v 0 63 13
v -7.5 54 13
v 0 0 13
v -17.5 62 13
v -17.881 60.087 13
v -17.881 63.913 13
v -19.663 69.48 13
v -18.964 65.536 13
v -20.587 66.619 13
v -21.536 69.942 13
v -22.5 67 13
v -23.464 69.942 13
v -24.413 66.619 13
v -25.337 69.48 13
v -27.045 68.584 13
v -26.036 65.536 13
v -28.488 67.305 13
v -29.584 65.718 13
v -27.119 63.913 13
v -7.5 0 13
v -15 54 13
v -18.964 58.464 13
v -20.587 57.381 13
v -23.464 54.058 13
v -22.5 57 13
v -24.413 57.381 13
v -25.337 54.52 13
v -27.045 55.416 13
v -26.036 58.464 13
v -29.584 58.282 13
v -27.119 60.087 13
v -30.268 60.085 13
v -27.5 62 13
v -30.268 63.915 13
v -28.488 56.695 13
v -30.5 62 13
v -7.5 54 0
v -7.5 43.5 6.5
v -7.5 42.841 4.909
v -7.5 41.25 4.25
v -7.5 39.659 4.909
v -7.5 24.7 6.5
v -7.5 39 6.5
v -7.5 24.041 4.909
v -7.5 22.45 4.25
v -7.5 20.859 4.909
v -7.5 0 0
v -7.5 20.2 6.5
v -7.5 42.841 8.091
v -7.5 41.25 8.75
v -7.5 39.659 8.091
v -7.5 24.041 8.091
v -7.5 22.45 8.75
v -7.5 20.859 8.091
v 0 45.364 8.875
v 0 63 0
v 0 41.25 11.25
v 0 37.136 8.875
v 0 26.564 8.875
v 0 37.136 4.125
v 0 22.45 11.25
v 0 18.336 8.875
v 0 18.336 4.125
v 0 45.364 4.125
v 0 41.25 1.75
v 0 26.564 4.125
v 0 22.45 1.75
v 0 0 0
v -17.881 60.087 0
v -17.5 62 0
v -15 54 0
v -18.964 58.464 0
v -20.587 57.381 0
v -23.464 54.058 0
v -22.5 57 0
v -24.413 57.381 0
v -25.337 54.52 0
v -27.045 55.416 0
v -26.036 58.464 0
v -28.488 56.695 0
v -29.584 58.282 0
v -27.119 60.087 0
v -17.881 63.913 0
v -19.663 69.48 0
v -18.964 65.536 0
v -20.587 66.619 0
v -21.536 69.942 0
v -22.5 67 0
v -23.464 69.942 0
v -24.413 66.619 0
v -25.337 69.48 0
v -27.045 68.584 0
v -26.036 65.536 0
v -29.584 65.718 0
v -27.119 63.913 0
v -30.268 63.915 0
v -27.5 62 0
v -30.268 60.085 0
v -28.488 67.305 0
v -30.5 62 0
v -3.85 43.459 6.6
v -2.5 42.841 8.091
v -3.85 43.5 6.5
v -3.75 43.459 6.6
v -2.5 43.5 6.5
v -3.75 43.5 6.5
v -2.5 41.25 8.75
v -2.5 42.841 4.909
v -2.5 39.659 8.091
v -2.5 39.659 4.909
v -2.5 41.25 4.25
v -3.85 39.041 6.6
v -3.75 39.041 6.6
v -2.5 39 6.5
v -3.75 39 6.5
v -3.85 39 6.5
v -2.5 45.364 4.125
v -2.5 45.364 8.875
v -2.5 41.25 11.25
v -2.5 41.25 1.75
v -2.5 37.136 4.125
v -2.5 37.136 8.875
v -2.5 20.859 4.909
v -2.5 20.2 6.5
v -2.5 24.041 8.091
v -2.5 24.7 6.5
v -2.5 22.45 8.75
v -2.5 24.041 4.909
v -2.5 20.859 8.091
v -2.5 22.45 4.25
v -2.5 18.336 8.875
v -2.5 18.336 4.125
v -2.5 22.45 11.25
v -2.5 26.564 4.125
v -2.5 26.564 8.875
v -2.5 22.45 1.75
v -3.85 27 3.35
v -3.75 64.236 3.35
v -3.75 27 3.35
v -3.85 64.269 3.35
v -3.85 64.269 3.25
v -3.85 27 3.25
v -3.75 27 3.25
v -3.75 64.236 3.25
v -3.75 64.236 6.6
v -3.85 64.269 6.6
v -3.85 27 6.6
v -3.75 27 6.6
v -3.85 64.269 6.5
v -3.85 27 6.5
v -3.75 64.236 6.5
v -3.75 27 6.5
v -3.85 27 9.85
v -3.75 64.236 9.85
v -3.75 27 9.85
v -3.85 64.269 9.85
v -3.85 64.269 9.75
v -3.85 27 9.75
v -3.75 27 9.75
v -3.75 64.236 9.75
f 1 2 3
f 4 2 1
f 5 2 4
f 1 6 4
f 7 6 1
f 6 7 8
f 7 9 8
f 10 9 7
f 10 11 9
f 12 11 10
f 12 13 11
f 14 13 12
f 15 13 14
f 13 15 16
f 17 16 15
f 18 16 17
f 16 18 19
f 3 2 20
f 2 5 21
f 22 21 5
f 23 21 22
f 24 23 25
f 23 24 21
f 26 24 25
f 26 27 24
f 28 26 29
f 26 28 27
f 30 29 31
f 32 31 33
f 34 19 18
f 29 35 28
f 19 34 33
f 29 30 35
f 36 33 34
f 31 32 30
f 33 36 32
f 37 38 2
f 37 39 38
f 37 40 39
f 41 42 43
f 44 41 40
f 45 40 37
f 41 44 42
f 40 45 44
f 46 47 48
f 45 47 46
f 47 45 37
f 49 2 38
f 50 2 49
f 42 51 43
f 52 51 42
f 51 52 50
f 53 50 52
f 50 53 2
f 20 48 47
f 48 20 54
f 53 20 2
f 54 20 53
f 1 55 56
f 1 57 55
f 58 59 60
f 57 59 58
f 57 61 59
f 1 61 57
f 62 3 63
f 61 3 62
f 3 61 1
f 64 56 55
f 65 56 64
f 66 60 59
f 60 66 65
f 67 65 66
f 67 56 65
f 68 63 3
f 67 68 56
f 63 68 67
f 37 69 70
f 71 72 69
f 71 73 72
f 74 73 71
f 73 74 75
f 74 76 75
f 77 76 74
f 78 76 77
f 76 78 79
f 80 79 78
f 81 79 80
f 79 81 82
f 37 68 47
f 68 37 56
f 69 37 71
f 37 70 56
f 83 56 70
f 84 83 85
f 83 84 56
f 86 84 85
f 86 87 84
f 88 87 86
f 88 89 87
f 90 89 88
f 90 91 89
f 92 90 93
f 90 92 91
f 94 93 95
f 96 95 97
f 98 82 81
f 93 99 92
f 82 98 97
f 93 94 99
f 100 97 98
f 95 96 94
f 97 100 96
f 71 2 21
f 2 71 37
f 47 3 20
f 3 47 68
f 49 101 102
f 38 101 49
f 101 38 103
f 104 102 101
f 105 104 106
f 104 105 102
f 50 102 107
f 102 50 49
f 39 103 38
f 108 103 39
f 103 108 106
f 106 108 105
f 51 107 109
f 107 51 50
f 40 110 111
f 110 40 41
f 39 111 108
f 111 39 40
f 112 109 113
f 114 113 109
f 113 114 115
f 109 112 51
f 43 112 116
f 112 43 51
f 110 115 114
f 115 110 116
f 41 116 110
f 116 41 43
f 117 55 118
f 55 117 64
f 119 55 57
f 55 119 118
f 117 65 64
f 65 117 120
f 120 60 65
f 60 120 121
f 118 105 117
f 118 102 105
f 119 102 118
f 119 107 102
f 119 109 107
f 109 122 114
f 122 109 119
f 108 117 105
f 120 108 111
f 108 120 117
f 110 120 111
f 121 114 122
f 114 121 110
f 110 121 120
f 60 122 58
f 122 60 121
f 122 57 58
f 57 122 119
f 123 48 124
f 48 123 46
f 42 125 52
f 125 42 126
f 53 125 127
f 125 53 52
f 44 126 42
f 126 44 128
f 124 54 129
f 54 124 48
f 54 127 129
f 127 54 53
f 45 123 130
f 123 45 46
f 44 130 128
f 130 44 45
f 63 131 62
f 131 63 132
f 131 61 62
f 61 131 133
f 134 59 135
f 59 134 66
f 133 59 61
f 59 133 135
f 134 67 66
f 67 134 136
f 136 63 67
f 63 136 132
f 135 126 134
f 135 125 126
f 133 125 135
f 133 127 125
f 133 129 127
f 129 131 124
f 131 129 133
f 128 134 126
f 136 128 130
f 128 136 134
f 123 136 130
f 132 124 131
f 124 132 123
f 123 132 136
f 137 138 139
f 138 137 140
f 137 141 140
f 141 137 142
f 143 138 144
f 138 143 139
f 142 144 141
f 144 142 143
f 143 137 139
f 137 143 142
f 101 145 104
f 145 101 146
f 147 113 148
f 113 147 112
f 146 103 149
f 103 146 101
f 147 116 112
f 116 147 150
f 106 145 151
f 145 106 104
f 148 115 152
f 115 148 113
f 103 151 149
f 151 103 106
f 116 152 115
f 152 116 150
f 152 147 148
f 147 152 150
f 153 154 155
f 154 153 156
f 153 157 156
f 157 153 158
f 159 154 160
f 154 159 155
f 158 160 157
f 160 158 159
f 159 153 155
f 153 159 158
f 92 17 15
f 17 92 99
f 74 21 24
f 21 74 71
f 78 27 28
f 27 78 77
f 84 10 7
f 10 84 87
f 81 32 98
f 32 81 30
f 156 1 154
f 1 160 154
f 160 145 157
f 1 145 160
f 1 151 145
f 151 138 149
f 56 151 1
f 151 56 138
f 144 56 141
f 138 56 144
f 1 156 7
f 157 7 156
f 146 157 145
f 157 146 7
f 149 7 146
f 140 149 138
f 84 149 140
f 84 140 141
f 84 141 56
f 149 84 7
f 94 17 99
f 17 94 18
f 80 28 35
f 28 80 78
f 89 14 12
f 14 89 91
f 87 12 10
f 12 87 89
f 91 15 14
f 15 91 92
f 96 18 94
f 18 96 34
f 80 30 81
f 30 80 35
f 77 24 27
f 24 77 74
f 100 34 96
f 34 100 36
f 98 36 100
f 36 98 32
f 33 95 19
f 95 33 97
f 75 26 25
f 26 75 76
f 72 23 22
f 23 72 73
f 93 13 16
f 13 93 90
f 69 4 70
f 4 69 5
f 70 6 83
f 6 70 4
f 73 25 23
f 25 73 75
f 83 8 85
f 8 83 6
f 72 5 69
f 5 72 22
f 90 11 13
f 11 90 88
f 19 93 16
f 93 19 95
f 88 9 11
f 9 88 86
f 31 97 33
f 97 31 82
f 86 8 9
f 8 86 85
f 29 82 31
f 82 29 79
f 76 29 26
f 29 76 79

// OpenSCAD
// [FL_INDEX: keywords="openscad, 3d_parametric, Parametric_Toilet_Lower_Seat_Hinge_Bracket, csg_solid" | COT="Parametric OpenSCAD design from 3DCodeverse"]
// Title: Parametric Toilet Lower Seat Hinge Bracket

// Lower Toilet Seat Hinge Bracket
// Designed by Mike Creuzer Dec 30 2012 -  thingiverse@creuzer.com

// measurements are as the part is in use using the bottom back edge of the seat as reference for all measurements
// rotated on its side for printing when done

//Bracket bit

BracketWidth = 13; 
BracketLength = 54; 
BracketHeight = 7.5;

// Hinge upright bit to center of hinge hole
HingeWidth = BracketWidth; 
HingeLength = 9; 
HingeHeight = 15;

// Hinge Hole
//Radius
HingeHoleRadius = 5;
HingeHoleWallThickness = 3;
// Smaller number is smoother circle & slower rendering
HingeHoleRoundness = 0.01; 

//Mounting Holes
// diameter
MountingHoleSize = 4.5; 
// diameter
MountingHoleScrewHeadSize = 9.5; 
MountingHoleScrewHeadthickness = 2.5; 
FirstMountingHole = 12.75;
DistanceBetweenMountingHole =  18.8;
// smaller is more round. 6 ought to give you a pentagon
ScrewHeadRoundness = 5; 
// smaller is more round. 6 ought to give you a pentagon
ScrewRoundness = 2; 




rotate(a=[0,-90,0]){ // Rotate to the -90 so the low poly count circles put the angles up for easier printing.

// Make the mounting leg
difference(){
	cube(size = [BracketWidth,BracketLength,BracketHeight], center = false);
	// first hole
	translate(v = [BracketWidth * .5, BracketLength - FirstMountingHole, 0]) cylinder(h=BracketHeight, r=MountingHoleSize/2, $fs=ScrewRoundness);
	translate(v = [BracketWidth * .5, BracketLength - FirstMountingHole, 0]) cylinder(h=MountingHoleScrewHeadthickness, r = MountingHoleScrewHeadSize/2, $fs=ScrewHeadRoundness);
	// second hole
	translate(v = [BracketWidth * .5, BracketLength - FirstMountingHole - DistanceBetweenMountingHole, 0]) cylinder(h=BracketHeight, r=MountingHoleSize/2, $fs=ScrewRoundness);
	translate(v = [BracketWidth * .5, BracketLength - FirstMountingHole - DistanceBetweenMountingHole, 0]) cylinder(h=MountingHoleScrewHeadthickness, r = MountingHoleScrewHeadSize/2, $fs=ScrewHeadRoundness);

	// pin holes for strength
	translate(v = [BracketWidth * .25, BracketLength * .5, BracketHeight * .5]) cube(size = [.1,BracketLength,.1], center = false);
	translate(v = [BracketWidth * .5, BracketLength * .5, BracketHeight * .5]) cube(size = [.1,BracketLength,.1], center = false);
	translate(v = [BracketWidth * .75, BracketLength * .5, BracketHeight * .5]) cube(size = [.1,BracketLength,.1], center = false);
}

// Make the hinge bit
difference() { // Make the hinge bracket, then minus the hole
	hull(){ // Make the hinge bracket all fancy looking
		translate(v = [0, BracketLength, 0]) cube(size = [HingeWidth,HingeLength,HingeHeight], center = false); // The support post
		translate(v = [0, BracketLength +HingeHoleRadius + HingeHoleWallThickness, HingeHeight +BracketHeight]) rotate(a=[0,90,0]) cylinder(h = BracketWidth, r=HingeHoleRadius + HingeHoleWallThickness, center = false, $fa=HingeHoleRoundness); // The round hinge bit
	}

	// The Hinge Hole
	translate(v = [-1, BracketLength +HingeHoleRadius + HingeHoleWallThickness, HingeHeight  + BracketHeight]) rotate(a=[0,90,0]) cylinder(h = BracketWidth*2, r=HingeHoleRadius, center = false, $fa=HingeHoleRoundness); 

	// pin holes for strength
	translate(v = [BracketWidth * .25, BracketLength * .5, BracketHeight * .5]) cube(size = [.1,BracketLength,.1], center = false);
	translate(v = [BracketWidth * .5, BracketLength * .5, BracketHeight * .5]) cube(size = [.1,BracketLength,.1], center = false);
	translate(v = [BracketWidth * .75, BracketLength * .5, BracketHeight * .5]) cube(size = [.1,BracketLength,.1], center = false);
}

}
